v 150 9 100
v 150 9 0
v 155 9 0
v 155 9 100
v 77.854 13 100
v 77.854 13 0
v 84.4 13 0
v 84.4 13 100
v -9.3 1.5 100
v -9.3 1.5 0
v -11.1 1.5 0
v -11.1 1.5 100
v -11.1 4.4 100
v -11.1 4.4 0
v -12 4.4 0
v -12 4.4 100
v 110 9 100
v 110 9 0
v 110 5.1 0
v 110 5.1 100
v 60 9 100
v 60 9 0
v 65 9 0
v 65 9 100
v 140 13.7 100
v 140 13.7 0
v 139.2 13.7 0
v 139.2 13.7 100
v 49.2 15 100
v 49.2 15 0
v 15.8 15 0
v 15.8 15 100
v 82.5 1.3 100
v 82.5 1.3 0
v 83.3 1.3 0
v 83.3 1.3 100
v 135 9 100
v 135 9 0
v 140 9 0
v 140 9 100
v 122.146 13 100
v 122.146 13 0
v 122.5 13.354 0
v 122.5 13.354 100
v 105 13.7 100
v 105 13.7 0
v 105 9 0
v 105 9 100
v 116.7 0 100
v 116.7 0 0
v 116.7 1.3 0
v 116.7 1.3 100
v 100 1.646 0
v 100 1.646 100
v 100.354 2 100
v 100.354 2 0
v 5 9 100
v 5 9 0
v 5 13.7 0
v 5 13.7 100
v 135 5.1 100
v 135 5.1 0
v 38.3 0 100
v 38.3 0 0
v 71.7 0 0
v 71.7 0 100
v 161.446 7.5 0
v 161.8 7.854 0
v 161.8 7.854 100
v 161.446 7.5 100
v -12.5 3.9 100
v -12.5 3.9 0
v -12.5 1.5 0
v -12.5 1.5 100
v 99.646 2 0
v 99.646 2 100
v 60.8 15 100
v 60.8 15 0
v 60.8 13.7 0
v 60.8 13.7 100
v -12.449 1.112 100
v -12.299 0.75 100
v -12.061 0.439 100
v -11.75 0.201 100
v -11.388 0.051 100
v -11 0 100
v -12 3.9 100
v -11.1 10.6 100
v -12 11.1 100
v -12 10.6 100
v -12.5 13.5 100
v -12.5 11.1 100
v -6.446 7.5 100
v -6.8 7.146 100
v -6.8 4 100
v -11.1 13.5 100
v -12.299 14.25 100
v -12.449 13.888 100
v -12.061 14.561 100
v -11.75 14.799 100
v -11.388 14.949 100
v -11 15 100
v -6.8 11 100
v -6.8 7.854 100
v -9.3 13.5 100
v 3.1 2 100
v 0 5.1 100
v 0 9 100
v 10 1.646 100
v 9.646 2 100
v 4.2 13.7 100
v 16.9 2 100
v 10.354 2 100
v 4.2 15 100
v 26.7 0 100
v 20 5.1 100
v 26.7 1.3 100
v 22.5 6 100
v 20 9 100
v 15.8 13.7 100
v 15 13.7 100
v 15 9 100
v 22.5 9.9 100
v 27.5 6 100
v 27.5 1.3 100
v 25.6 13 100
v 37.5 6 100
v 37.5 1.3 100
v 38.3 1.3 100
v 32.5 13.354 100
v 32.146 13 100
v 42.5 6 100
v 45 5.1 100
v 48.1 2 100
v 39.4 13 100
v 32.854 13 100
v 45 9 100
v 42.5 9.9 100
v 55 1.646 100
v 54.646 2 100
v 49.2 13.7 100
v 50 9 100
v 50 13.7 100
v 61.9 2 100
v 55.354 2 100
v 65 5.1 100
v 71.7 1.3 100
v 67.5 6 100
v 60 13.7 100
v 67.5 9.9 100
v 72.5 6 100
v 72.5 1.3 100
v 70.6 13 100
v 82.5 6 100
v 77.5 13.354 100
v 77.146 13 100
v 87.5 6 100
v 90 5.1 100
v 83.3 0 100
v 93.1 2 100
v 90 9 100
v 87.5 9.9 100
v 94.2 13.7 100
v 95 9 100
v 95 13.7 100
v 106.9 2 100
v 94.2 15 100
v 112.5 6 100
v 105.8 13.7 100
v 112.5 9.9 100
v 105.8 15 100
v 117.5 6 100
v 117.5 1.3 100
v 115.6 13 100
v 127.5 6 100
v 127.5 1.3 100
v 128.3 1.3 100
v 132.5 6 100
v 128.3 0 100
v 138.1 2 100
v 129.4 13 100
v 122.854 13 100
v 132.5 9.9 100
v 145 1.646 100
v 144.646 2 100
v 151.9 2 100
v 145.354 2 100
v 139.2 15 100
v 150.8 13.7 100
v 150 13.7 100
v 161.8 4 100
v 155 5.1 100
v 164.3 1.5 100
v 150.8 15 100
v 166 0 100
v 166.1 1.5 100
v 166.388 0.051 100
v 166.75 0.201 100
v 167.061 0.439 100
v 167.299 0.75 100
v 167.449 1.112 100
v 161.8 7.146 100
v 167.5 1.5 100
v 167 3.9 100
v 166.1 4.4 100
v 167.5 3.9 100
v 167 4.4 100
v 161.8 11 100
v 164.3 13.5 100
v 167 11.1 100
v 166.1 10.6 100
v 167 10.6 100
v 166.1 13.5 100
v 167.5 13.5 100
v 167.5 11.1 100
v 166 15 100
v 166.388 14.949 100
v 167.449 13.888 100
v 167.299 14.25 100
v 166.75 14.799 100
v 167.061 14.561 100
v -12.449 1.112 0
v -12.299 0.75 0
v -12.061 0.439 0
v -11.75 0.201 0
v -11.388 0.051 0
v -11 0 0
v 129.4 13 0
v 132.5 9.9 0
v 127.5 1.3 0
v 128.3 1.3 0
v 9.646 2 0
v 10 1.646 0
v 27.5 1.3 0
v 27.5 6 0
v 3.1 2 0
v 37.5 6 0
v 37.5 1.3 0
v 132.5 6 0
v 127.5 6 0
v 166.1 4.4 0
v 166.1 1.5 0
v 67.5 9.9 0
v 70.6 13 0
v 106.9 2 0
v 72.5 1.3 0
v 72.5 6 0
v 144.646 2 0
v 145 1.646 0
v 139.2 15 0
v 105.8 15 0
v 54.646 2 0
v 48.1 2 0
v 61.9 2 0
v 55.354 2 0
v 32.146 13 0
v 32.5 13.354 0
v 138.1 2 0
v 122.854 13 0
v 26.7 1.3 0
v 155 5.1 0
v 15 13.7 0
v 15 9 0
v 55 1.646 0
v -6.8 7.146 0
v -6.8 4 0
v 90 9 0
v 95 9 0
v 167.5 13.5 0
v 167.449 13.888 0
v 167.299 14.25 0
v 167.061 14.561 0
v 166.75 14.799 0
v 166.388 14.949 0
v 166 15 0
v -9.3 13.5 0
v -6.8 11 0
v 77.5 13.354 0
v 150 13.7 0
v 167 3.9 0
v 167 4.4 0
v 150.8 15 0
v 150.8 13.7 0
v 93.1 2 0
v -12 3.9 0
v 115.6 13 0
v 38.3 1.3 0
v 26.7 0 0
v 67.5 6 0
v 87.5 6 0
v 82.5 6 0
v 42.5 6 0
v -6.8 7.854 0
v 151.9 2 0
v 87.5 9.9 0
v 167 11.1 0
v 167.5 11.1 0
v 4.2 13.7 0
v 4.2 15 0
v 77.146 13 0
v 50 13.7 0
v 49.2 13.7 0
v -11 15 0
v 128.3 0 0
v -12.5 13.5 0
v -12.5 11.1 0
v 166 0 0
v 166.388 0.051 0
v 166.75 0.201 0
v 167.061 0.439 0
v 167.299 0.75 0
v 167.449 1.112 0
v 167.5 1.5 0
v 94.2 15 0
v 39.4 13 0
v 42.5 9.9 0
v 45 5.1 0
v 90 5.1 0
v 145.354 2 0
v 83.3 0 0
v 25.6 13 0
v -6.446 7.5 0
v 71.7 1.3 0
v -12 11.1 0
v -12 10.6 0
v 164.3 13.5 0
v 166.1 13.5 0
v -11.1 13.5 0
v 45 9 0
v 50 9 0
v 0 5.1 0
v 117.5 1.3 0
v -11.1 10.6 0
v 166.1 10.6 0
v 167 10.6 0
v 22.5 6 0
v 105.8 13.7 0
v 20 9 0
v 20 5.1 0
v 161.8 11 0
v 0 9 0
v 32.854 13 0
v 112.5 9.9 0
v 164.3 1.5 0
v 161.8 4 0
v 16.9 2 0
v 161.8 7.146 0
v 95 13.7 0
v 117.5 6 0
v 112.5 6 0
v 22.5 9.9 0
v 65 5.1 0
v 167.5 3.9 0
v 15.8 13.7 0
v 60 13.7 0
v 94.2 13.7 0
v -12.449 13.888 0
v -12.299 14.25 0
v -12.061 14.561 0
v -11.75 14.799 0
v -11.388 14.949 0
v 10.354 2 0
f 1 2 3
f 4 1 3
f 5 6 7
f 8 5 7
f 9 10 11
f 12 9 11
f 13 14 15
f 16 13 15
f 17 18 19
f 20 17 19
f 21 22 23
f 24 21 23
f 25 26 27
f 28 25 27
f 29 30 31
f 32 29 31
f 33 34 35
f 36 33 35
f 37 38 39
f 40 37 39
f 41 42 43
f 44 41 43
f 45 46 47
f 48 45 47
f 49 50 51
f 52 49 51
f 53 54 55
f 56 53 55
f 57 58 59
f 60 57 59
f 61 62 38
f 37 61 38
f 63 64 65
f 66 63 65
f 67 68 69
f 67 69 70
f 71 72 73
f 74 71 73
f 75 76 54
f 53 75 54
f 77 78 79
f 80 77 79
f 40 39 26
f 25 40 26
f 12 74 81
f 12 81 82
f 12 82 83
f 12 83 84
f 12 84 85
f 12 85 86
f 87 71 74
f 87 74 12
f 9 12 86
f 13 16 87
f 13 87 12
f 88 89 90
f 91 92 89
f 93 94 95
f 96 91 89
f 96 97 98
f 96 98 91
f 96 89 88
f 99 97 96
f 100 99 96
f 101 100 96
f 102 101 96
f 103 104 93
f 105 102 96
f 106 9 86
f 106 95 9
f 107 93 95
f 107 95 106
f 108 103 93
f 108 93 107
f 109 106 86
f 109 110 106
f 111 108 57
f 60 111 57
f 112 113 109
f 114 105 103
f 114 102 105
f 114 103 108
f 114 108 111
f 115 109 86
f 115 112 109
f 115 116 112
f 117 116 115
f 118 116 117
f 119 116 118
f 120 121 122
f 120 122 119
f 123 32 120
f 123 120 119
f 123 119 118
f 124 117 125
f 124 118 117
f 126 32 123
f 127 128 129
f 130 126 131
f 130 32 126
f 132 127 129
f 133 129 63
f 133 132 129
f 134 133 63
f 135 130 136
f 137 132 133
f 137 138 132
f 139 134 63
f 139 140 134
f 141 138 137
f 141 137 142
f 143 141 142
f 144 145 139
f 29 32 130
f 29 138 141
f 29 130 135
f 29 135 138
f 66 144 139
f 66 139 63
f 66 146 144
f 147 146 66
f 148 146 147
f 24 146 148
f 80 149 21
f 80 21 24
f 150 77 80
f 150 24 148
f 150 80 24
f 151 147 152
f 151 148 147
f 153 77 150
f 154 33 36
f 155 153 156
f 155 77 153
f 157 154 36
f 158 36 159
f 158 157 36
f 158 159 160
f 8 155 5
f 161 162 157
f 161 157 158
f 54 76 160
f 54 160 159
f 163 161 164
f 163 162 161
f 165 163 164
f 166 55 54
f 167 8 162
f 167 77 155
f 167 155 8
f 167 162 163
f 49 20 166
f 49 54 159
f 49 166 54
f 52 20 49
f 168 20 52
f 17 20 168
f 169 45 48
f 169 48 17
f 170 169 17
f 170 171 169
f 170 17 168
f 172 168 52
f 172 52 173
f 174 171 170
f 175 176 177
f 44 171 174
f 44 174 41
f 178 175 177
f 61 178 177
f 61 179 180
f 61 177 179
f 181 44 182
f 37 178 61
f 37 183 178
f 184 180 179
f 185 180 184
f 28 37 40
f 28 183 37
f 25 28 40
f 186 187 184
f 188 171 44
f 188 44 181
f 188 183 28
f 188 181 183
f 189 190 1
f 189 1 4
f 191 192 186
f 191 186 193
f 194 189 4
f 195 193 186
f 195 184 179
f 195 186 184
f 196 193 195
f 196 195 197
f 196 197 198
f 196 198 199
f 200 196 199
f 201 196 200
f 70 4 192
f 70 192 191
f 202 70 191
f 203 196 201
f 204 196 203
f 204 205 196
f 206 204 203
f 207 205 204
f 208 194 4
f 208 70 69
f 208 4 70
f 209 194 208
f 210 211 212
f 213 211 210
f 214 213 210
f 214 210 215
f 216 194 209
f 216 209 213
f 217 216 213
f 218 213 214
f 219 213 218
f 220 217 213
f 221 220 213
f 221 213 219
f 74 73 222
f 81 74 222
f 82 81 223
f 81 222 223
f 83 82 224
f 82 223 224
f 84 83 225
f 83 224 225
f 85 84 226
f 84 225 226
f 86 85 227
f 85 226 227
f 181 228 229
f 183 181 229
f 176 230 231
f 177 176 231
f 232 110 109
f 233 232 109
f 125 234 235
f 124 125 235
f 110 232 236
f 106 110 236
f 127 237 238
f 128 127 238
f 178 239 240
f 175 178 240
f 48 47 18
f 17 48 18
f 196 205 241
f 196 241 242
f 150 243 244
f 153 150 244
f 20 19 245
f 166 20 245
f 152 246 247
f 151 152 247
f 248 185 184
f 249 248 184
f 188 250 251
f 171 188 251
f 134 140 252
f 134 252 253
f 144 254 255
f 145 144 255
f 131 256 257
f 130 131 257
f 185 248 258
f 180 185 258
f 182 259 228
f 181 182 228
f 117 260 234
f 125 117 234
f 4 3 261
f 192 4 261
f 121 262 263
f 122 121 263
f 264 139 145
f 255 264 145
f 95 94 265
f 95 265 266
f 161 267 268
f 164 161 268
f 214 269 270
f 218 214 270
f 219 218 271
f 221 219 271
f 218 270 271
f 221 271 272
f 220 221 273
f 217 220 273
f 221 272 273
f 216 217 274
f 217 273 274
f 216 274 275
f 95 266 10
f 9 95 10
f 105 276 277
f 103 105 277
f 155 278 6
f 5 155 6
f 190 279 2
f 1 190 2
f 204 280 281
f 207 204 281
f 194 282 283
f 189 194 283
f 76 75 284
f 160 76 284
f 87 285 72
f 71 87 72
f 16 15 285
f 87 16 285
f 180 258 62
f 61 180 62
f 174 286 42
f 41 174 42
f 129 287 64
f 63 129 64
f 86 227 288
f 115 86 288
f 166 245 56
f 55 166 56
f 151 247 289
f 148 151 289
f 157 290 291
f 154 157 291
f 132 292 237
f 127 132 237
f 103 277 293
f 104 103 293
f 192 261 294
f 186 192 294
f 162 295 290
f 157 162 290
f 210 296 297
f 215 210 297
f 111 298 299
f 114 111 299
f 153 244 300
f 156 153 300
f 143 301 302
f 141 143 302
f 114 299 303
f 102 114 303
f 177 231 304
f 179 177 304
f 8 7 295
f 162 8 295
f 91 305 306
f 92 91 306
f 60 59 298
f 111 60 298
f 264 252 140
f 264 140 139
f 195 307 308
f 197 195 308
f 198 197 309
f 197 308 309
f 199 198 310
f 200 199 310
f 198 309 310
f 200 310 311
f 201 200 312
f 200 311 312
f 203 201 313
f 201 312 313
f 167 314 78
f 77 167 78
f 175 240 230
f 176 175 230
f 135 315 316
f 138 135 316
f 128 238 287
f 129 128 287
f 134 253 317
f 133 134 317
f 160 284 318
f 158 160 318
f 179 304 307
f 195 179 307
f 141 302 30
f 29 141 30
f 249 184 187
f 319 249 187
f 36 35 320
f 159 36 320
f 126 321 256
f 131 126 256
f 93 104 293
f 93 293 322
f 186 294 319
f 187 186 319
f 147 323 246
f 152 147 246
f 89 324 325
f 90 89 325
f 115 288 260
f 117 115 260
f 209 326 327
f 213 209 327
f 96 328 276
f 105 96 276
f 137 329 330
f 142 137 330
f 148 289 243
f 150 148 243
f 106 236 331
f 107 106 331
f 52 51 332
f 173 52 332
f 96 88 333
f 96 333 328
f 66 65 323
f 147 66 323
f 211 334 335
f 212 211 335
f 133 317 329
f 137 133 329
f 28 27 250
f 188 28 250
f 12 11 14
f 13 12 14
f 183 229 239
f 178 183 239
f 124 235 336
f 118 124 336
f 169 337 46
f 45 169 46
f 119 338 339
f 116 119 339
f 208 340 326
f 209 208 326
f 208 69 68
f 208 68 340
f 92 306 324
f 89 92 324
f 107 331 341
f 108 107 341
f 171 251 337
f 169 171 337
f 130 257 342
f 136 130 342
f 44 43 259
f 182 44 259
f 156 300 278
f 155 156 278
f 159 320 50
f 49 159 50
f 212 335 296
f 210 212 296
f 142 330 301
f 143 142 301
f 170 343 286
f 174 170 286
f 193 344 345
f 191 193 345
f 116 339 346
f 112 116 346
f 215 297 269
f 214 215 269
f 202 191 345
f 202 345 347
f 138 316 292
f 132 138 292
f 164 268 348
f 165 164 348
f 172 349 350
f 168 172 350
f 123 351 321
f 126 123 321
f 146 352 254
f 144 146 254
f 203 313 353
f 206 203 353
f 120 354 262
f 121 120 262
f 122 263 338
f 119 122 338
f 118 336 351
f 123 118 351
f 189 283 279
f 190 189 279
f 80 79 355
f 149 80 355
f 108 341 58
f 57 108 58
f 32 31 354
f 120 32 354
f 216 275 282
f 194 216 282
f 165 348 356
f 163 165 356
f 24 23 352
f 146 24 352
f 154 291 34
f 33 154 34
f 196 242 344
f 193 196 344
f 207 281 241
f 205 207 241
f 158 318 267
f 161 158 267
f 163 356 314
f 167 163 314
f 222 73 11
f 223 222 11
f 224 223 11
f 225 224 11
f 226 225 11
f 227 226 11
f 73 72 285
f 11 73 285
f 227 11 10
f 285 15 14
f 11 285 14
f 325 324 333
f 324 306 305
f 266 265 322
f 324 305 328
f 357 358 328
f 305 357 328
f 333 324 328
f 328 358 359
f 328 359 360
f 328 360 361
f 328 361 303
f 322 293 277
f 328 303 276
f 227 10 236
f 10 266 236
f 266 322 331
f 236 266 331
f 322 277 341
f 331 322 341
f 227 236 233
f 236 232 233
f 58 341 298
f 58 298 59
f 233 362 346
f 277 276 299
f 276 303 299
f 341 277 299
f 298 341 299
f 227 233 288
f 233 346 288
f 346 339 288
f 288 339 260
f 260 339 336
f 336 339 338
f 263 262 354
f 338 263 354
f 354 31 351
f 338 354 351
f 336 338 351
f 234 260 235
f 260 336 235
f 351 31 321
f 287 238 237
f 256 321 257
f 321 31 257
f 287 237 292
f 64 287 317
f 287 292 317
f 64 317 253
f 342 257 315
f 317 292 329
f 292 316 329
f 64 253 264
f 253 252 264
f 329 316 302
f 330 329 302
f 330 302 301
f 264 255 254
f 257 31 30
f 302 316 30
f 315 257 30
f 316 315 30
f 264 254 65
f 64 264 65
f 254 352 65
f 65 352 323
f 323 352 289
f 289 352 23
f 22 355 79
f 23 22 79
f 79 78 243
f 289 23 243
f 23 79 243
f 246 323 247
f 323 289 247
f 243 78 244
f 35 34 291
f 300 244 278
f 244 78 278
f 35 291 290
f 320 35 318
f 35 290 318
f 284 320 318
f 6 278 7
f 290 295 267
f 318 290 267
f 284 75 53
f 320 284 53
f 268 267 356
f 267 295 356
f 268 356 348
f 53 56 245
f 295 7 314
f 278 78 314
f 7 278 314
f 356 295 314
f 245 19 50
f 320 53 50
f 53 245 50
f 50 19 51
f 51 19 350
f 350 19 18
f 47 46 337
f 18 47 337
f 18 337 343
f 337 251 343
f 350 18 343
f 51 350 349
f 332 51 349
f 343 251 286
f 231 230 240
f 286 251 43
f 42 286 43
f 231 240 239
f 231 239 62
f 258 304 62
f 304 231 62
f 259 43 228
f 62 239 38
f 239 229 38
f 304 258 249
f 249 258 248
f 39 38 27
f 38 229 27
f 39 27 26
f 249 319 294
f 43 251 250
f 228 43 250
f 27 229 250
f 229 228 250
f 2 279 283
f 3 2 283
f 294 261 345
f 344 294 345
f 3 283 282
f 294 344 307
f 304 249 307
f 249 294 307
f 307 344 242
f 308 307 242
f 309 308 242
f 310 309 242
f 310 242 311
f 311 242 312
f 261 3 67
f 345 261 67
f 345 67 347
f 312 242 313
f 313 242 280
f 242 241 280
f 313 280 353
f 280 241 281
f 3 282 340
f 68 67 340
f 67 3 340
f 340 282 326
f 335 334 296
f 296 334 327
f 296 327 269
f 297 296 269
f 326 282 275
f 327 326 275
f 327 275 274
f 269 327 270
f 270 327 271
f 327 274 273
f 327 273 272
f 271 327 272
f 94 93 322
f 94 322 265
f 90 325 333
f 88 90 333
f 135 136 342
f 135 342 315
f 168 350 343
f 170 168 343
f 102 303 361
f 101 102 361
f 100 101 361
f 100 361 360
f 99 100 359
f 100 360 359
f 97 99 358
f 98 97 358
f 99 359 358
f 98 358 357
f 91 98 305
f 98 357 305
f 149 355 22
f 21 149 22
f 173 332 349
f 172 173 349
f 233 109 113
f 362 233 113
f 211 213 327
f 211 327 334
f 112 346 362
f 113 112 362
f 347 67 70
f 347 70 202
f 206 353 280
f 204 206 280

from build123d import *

# Parameters (mm, degrees)
EXTRUDE_1_DEPTH     = 100
CUT_EXTRUDE_1_DEPTH = 100


with BuildPart() as part:
    # Model → Бобышка-Вытянуть1 (new body)
    with BuildSketch(Plane.XY):
        with BuildLine():
            Line((-12.5, 11.1), (-12, 11.1))
            Line((-12, 11.1), (-12, 10.6))
            Line((-12, 10.6), (-11.1, 10.6))
            Line((-11.1, 10.6), (-11.1, 13.5))
            Line((-11.1, 13.5), (-9.3, 13.5))
            Line((-9.3, 13.5), (-6.8, 11))
            Line((-6.8, 11), (-6.8, 4))
            Line((-6.8, 4), (-9.3, 1.5))
            Line((-9.3, 1.5), (-11.1, 1.5))
            Line((-11.1, 1.5), (-11.1, 4.4))
            Line((-11.1, 4.4), (-12, 4.4))
            Line((-12, 4.4), (-12, 3.9))
            Line((-12, 3.9), (-12.5, 3.9))
            Line((-12.5, 3.9), (-12.5, 1.5))
            ThreePointArc((-12.5, 1.5), (-12.060660172, 0.439339828), (-11, 0))
            Line((-11, 0), (26.7, 0))
            Line((26.7, 0), (26.7, 1.3))
            Line((26.7, 1.3), (27.5, 1.3))
            Line((27.5, 1.3), (27.5, 6))
            Line((27.5, 6), (22.5, 6))
            Line((22.5, 6), (22.5, 9.9))
            Line((22.5, 9.9), (25.6, 13))
            Line((25.6, 13), (39.4, 13))
            Line((39.4, 13), (42.5, 9.9))
            Line((42.5, 9.9), (42.5, 6))
            Line((42.5, 6), (37.5, 6))
            Line((37.5, 6), (37.5, 1.3))
            Line((37.5, 1.3), (38.3, 1.3))
            Line((38.3, 1.3), (38.3, 0))
            Line((38.3, 0), (71.7, 0))
            Line((71.7, 0), (71.7, 1.3))
            Line((71.7, 1.3), (72.5, 1.3))
            Line((72.5, 1.3), (72.5, 6))
            Line((72.5, 6), (67.5, 6))
            Line((67.5, 6), (67.5, 9.9))
            Line((67.5, 9.9), (70.6, 13))
            Line((70.6, 13), (84.4, 13))
            Line((84.4, 13), (87.5, 9.9))
            Line((87.5, 9.9), (87.5, 6))
            Line((87.5, 6), (82.5, 6))
            Line((82.5, 6), (82.5, 1.3))
            Line((82.5, 1.3), (83.3, 1.3))
            Line((83.3, 1.3), (83.3, 0))
            Line((83.3, 0), (116.7, 0))
            Line((116.7, 0), (116.7, 1.3))
            Line((116.7, 1.3), (117.5, 1.3))
            Line((117.5, 1.3), (117.5, 6))
            Line((117.5, 6), (112.5, 6))
            Line((112.5, 6), (112.5, 9.9))
            Line((112.5, 9.9), (115.6, 13))
            Line((115.6, 13), (129.4, 13))
            Line((129.4, 13), (132.5, 9.9))
            Line((132.5, 9.9), (132.5, 6))
            Line((132.5, 6), (127.5, 6))
            Line((127.5, 6), (127.5, 1.3))
            Line((127.5, 1.3), (128.3, 1.3))
            Line((128.3, 1.3), (128.3, 0))
            Line((128.3, 0), (166, 0))
            ThreePointArc((166, 0), (167.060660172, 0.439339828), (167.5, 1.5))
            Line((167.5, 1.5), (167.5, 3.9))
            Line((167.5, 3.9), (167, 3.9))
            Line((167, 3.9), (167, 4.4))
            Line((167, 4.4), (166.1, 4.4))
            Line((166.1, 4.4), (166.1, 1.5))
            Line((166.1, 1.5), (164.3, 1.5))
            Line((164.3, 1.5), (161.8, 4))
            Line((161.8, 4), (161.8, 11))
            Line((161.8, 11), (164.3, 13.5))
            Line((164.3, 13.5), (166.1, 13.5))
            Line((166.1, 13.5), (166.1, 10.6))
            Line((166.1, 10.6), (167, 10.6))
            Line((167, 10.6), (167, 11.1))
            Line((167, 11.1), (167.5, 11.1))
            Line((167.5, 11.1), (167.5, 13.5))
            ThreePointArc((167.5, 13.5), (167.060660172, 14.560660172), (166, 15))
            Line((166, 15), (150.8, 15))
            Line((150.8, 15), (150.8, 13.7))
            Line((150.8, 13.7), (150, 13.7))
            Line((150, 13.7), (150, 9))
            Line((150, 9), (155, 9))
            Line((155, 9), (155, 5.1))
            Line((155, 5.1), (151.9, 2))
            Line((151.9, 2), (138.1, 2))
            Line((138.1, 2), (135, 5.1))
            Line((135, 5.1), (135, 9))
            Line((135, 9), (140, 9))
            Line((140, 9), (140, 13.7))
            Line((140, 13.7), (139.2, 13.7))
            Line((139.2, 13.7), (139.2, 15))
            Line((139.2, 15), (105.8, 15))
            Line((105.8, 15), (105.8, 13.7))
            Line((105.8, 13.7), (105, 13.7))
            Line((105, 13.7), (105, 9))
            Line((105, 9), (110, 9))
            Line((110, 9), (110, 5.1))
            Line((110, 5.1), (106.9, 2))
            Line((106.9, 2), (93.1, 2))
            Line((93.1, 2), (90, 5.1))
            Line((90, 5.1), (90, 9))
            Line((90, 9), (95, 9))
            Line((95, 9), (95, 13.7))
            Line((95, 13.7), (94.2, 13.7))
            Line((94.2, 13.7), (94.2, 15))
            Line((94.2, 15), (60.8, 15))
            Line((60.8, 15), (60.8, 13.7))
            Line((60.8, 13.7), (60, 13.7))
            Line((60, 13.7), (60, 9))
            Line((60, 9), (65, 9))
            Line((65, 9), (65, 5.1))
            Line((65, 5.1), (61.9, 2))
            Line((61.9, 2), (48.1, 2))
            Line((48.1, 2), (45, 5.1))
            Line((45, 5.1), (45, 9))
            Line((45, 9), (50, 9))
            Line((50, 9), (50, 13.7))
            Line((50, 13.7), (49.2, 13.7))
            Line((49.2, 13.7), (49.2, 15))
            Line((49.2, 15), (15.8, 15))
            Line((15.8, 15), (15.8, 13.7))
            Line((15.8, 13.7), (15, 13.7))
            Line((15, 13.7), (15, 9))
            Line((15, 9), (20, 9))
            Line((20, 9), (20, 5.1))
            Line((20, 5.1), (16.9, 2))
            Line((16.9, 2), (3.1, 2))
            Line((3.1, 2), (0, 5.1))
            Line((0, 5.1), (0, 9))
            Line((0, 9), (5, 9))
            Line((5, 9), (5, 13.7))
            Line((5, 13.7), (4.2, 13.7))
            Line((4.2, 13.7), (4.2, 15))
            Line((4.2, 15), (-11, 15))
            ThreePointArc((-11, 15), (-12.060660172, 14.560660172), (-12.5, 13.5))
            Line((-12.5, 13.5), (-12.5, 11.1))
        make_face()
    extrude(amount=EXTRUDE_1_DEPTH)

    # Эскиз1 → Вырез-Вытянуть1 (cut)
    with BuildSketch(Plane.XY.offset(100)):
        Polygon((-6.8, 7.853553391), (-6.446446609, 7.5), (-6.8, 7.146446609), align=None)
        Polygon((9.646446609, 2), (10, 1.646446609), (10.353553391, 2), align=None)
        Polygon((32.146446609, 13), (32.5, 13.353553391), (32.853553391, 13), align=None)
        Polygon((54.646446609, 2), (55, 1.646446609), (55.353553391, 2), align=None)
        Polygon((77.146446609, 13), (77.5, 13.353553391), (77.853553391, 13), align=None)
        Polygon((99.646446609, 2), (100, 1.646446609), (100.353553391, 2), align=None)
        Polygon((122.146446609, 13), (122.5, 13.353553391), (122.853553391, 13), align=None)
        Polygon((144.646446609, 2), (145, 1.646446609), (145.353553391, 2), align=None)
        Polygon((161.8, 7.853553391), (161.446446609, 7.5), (161.8, 7.146446609), align=None)
    extrude(amount=-CUT_EXTRUDE_1_DEPTH, mode=Mode.SUBTRACT)


solid = part.part
